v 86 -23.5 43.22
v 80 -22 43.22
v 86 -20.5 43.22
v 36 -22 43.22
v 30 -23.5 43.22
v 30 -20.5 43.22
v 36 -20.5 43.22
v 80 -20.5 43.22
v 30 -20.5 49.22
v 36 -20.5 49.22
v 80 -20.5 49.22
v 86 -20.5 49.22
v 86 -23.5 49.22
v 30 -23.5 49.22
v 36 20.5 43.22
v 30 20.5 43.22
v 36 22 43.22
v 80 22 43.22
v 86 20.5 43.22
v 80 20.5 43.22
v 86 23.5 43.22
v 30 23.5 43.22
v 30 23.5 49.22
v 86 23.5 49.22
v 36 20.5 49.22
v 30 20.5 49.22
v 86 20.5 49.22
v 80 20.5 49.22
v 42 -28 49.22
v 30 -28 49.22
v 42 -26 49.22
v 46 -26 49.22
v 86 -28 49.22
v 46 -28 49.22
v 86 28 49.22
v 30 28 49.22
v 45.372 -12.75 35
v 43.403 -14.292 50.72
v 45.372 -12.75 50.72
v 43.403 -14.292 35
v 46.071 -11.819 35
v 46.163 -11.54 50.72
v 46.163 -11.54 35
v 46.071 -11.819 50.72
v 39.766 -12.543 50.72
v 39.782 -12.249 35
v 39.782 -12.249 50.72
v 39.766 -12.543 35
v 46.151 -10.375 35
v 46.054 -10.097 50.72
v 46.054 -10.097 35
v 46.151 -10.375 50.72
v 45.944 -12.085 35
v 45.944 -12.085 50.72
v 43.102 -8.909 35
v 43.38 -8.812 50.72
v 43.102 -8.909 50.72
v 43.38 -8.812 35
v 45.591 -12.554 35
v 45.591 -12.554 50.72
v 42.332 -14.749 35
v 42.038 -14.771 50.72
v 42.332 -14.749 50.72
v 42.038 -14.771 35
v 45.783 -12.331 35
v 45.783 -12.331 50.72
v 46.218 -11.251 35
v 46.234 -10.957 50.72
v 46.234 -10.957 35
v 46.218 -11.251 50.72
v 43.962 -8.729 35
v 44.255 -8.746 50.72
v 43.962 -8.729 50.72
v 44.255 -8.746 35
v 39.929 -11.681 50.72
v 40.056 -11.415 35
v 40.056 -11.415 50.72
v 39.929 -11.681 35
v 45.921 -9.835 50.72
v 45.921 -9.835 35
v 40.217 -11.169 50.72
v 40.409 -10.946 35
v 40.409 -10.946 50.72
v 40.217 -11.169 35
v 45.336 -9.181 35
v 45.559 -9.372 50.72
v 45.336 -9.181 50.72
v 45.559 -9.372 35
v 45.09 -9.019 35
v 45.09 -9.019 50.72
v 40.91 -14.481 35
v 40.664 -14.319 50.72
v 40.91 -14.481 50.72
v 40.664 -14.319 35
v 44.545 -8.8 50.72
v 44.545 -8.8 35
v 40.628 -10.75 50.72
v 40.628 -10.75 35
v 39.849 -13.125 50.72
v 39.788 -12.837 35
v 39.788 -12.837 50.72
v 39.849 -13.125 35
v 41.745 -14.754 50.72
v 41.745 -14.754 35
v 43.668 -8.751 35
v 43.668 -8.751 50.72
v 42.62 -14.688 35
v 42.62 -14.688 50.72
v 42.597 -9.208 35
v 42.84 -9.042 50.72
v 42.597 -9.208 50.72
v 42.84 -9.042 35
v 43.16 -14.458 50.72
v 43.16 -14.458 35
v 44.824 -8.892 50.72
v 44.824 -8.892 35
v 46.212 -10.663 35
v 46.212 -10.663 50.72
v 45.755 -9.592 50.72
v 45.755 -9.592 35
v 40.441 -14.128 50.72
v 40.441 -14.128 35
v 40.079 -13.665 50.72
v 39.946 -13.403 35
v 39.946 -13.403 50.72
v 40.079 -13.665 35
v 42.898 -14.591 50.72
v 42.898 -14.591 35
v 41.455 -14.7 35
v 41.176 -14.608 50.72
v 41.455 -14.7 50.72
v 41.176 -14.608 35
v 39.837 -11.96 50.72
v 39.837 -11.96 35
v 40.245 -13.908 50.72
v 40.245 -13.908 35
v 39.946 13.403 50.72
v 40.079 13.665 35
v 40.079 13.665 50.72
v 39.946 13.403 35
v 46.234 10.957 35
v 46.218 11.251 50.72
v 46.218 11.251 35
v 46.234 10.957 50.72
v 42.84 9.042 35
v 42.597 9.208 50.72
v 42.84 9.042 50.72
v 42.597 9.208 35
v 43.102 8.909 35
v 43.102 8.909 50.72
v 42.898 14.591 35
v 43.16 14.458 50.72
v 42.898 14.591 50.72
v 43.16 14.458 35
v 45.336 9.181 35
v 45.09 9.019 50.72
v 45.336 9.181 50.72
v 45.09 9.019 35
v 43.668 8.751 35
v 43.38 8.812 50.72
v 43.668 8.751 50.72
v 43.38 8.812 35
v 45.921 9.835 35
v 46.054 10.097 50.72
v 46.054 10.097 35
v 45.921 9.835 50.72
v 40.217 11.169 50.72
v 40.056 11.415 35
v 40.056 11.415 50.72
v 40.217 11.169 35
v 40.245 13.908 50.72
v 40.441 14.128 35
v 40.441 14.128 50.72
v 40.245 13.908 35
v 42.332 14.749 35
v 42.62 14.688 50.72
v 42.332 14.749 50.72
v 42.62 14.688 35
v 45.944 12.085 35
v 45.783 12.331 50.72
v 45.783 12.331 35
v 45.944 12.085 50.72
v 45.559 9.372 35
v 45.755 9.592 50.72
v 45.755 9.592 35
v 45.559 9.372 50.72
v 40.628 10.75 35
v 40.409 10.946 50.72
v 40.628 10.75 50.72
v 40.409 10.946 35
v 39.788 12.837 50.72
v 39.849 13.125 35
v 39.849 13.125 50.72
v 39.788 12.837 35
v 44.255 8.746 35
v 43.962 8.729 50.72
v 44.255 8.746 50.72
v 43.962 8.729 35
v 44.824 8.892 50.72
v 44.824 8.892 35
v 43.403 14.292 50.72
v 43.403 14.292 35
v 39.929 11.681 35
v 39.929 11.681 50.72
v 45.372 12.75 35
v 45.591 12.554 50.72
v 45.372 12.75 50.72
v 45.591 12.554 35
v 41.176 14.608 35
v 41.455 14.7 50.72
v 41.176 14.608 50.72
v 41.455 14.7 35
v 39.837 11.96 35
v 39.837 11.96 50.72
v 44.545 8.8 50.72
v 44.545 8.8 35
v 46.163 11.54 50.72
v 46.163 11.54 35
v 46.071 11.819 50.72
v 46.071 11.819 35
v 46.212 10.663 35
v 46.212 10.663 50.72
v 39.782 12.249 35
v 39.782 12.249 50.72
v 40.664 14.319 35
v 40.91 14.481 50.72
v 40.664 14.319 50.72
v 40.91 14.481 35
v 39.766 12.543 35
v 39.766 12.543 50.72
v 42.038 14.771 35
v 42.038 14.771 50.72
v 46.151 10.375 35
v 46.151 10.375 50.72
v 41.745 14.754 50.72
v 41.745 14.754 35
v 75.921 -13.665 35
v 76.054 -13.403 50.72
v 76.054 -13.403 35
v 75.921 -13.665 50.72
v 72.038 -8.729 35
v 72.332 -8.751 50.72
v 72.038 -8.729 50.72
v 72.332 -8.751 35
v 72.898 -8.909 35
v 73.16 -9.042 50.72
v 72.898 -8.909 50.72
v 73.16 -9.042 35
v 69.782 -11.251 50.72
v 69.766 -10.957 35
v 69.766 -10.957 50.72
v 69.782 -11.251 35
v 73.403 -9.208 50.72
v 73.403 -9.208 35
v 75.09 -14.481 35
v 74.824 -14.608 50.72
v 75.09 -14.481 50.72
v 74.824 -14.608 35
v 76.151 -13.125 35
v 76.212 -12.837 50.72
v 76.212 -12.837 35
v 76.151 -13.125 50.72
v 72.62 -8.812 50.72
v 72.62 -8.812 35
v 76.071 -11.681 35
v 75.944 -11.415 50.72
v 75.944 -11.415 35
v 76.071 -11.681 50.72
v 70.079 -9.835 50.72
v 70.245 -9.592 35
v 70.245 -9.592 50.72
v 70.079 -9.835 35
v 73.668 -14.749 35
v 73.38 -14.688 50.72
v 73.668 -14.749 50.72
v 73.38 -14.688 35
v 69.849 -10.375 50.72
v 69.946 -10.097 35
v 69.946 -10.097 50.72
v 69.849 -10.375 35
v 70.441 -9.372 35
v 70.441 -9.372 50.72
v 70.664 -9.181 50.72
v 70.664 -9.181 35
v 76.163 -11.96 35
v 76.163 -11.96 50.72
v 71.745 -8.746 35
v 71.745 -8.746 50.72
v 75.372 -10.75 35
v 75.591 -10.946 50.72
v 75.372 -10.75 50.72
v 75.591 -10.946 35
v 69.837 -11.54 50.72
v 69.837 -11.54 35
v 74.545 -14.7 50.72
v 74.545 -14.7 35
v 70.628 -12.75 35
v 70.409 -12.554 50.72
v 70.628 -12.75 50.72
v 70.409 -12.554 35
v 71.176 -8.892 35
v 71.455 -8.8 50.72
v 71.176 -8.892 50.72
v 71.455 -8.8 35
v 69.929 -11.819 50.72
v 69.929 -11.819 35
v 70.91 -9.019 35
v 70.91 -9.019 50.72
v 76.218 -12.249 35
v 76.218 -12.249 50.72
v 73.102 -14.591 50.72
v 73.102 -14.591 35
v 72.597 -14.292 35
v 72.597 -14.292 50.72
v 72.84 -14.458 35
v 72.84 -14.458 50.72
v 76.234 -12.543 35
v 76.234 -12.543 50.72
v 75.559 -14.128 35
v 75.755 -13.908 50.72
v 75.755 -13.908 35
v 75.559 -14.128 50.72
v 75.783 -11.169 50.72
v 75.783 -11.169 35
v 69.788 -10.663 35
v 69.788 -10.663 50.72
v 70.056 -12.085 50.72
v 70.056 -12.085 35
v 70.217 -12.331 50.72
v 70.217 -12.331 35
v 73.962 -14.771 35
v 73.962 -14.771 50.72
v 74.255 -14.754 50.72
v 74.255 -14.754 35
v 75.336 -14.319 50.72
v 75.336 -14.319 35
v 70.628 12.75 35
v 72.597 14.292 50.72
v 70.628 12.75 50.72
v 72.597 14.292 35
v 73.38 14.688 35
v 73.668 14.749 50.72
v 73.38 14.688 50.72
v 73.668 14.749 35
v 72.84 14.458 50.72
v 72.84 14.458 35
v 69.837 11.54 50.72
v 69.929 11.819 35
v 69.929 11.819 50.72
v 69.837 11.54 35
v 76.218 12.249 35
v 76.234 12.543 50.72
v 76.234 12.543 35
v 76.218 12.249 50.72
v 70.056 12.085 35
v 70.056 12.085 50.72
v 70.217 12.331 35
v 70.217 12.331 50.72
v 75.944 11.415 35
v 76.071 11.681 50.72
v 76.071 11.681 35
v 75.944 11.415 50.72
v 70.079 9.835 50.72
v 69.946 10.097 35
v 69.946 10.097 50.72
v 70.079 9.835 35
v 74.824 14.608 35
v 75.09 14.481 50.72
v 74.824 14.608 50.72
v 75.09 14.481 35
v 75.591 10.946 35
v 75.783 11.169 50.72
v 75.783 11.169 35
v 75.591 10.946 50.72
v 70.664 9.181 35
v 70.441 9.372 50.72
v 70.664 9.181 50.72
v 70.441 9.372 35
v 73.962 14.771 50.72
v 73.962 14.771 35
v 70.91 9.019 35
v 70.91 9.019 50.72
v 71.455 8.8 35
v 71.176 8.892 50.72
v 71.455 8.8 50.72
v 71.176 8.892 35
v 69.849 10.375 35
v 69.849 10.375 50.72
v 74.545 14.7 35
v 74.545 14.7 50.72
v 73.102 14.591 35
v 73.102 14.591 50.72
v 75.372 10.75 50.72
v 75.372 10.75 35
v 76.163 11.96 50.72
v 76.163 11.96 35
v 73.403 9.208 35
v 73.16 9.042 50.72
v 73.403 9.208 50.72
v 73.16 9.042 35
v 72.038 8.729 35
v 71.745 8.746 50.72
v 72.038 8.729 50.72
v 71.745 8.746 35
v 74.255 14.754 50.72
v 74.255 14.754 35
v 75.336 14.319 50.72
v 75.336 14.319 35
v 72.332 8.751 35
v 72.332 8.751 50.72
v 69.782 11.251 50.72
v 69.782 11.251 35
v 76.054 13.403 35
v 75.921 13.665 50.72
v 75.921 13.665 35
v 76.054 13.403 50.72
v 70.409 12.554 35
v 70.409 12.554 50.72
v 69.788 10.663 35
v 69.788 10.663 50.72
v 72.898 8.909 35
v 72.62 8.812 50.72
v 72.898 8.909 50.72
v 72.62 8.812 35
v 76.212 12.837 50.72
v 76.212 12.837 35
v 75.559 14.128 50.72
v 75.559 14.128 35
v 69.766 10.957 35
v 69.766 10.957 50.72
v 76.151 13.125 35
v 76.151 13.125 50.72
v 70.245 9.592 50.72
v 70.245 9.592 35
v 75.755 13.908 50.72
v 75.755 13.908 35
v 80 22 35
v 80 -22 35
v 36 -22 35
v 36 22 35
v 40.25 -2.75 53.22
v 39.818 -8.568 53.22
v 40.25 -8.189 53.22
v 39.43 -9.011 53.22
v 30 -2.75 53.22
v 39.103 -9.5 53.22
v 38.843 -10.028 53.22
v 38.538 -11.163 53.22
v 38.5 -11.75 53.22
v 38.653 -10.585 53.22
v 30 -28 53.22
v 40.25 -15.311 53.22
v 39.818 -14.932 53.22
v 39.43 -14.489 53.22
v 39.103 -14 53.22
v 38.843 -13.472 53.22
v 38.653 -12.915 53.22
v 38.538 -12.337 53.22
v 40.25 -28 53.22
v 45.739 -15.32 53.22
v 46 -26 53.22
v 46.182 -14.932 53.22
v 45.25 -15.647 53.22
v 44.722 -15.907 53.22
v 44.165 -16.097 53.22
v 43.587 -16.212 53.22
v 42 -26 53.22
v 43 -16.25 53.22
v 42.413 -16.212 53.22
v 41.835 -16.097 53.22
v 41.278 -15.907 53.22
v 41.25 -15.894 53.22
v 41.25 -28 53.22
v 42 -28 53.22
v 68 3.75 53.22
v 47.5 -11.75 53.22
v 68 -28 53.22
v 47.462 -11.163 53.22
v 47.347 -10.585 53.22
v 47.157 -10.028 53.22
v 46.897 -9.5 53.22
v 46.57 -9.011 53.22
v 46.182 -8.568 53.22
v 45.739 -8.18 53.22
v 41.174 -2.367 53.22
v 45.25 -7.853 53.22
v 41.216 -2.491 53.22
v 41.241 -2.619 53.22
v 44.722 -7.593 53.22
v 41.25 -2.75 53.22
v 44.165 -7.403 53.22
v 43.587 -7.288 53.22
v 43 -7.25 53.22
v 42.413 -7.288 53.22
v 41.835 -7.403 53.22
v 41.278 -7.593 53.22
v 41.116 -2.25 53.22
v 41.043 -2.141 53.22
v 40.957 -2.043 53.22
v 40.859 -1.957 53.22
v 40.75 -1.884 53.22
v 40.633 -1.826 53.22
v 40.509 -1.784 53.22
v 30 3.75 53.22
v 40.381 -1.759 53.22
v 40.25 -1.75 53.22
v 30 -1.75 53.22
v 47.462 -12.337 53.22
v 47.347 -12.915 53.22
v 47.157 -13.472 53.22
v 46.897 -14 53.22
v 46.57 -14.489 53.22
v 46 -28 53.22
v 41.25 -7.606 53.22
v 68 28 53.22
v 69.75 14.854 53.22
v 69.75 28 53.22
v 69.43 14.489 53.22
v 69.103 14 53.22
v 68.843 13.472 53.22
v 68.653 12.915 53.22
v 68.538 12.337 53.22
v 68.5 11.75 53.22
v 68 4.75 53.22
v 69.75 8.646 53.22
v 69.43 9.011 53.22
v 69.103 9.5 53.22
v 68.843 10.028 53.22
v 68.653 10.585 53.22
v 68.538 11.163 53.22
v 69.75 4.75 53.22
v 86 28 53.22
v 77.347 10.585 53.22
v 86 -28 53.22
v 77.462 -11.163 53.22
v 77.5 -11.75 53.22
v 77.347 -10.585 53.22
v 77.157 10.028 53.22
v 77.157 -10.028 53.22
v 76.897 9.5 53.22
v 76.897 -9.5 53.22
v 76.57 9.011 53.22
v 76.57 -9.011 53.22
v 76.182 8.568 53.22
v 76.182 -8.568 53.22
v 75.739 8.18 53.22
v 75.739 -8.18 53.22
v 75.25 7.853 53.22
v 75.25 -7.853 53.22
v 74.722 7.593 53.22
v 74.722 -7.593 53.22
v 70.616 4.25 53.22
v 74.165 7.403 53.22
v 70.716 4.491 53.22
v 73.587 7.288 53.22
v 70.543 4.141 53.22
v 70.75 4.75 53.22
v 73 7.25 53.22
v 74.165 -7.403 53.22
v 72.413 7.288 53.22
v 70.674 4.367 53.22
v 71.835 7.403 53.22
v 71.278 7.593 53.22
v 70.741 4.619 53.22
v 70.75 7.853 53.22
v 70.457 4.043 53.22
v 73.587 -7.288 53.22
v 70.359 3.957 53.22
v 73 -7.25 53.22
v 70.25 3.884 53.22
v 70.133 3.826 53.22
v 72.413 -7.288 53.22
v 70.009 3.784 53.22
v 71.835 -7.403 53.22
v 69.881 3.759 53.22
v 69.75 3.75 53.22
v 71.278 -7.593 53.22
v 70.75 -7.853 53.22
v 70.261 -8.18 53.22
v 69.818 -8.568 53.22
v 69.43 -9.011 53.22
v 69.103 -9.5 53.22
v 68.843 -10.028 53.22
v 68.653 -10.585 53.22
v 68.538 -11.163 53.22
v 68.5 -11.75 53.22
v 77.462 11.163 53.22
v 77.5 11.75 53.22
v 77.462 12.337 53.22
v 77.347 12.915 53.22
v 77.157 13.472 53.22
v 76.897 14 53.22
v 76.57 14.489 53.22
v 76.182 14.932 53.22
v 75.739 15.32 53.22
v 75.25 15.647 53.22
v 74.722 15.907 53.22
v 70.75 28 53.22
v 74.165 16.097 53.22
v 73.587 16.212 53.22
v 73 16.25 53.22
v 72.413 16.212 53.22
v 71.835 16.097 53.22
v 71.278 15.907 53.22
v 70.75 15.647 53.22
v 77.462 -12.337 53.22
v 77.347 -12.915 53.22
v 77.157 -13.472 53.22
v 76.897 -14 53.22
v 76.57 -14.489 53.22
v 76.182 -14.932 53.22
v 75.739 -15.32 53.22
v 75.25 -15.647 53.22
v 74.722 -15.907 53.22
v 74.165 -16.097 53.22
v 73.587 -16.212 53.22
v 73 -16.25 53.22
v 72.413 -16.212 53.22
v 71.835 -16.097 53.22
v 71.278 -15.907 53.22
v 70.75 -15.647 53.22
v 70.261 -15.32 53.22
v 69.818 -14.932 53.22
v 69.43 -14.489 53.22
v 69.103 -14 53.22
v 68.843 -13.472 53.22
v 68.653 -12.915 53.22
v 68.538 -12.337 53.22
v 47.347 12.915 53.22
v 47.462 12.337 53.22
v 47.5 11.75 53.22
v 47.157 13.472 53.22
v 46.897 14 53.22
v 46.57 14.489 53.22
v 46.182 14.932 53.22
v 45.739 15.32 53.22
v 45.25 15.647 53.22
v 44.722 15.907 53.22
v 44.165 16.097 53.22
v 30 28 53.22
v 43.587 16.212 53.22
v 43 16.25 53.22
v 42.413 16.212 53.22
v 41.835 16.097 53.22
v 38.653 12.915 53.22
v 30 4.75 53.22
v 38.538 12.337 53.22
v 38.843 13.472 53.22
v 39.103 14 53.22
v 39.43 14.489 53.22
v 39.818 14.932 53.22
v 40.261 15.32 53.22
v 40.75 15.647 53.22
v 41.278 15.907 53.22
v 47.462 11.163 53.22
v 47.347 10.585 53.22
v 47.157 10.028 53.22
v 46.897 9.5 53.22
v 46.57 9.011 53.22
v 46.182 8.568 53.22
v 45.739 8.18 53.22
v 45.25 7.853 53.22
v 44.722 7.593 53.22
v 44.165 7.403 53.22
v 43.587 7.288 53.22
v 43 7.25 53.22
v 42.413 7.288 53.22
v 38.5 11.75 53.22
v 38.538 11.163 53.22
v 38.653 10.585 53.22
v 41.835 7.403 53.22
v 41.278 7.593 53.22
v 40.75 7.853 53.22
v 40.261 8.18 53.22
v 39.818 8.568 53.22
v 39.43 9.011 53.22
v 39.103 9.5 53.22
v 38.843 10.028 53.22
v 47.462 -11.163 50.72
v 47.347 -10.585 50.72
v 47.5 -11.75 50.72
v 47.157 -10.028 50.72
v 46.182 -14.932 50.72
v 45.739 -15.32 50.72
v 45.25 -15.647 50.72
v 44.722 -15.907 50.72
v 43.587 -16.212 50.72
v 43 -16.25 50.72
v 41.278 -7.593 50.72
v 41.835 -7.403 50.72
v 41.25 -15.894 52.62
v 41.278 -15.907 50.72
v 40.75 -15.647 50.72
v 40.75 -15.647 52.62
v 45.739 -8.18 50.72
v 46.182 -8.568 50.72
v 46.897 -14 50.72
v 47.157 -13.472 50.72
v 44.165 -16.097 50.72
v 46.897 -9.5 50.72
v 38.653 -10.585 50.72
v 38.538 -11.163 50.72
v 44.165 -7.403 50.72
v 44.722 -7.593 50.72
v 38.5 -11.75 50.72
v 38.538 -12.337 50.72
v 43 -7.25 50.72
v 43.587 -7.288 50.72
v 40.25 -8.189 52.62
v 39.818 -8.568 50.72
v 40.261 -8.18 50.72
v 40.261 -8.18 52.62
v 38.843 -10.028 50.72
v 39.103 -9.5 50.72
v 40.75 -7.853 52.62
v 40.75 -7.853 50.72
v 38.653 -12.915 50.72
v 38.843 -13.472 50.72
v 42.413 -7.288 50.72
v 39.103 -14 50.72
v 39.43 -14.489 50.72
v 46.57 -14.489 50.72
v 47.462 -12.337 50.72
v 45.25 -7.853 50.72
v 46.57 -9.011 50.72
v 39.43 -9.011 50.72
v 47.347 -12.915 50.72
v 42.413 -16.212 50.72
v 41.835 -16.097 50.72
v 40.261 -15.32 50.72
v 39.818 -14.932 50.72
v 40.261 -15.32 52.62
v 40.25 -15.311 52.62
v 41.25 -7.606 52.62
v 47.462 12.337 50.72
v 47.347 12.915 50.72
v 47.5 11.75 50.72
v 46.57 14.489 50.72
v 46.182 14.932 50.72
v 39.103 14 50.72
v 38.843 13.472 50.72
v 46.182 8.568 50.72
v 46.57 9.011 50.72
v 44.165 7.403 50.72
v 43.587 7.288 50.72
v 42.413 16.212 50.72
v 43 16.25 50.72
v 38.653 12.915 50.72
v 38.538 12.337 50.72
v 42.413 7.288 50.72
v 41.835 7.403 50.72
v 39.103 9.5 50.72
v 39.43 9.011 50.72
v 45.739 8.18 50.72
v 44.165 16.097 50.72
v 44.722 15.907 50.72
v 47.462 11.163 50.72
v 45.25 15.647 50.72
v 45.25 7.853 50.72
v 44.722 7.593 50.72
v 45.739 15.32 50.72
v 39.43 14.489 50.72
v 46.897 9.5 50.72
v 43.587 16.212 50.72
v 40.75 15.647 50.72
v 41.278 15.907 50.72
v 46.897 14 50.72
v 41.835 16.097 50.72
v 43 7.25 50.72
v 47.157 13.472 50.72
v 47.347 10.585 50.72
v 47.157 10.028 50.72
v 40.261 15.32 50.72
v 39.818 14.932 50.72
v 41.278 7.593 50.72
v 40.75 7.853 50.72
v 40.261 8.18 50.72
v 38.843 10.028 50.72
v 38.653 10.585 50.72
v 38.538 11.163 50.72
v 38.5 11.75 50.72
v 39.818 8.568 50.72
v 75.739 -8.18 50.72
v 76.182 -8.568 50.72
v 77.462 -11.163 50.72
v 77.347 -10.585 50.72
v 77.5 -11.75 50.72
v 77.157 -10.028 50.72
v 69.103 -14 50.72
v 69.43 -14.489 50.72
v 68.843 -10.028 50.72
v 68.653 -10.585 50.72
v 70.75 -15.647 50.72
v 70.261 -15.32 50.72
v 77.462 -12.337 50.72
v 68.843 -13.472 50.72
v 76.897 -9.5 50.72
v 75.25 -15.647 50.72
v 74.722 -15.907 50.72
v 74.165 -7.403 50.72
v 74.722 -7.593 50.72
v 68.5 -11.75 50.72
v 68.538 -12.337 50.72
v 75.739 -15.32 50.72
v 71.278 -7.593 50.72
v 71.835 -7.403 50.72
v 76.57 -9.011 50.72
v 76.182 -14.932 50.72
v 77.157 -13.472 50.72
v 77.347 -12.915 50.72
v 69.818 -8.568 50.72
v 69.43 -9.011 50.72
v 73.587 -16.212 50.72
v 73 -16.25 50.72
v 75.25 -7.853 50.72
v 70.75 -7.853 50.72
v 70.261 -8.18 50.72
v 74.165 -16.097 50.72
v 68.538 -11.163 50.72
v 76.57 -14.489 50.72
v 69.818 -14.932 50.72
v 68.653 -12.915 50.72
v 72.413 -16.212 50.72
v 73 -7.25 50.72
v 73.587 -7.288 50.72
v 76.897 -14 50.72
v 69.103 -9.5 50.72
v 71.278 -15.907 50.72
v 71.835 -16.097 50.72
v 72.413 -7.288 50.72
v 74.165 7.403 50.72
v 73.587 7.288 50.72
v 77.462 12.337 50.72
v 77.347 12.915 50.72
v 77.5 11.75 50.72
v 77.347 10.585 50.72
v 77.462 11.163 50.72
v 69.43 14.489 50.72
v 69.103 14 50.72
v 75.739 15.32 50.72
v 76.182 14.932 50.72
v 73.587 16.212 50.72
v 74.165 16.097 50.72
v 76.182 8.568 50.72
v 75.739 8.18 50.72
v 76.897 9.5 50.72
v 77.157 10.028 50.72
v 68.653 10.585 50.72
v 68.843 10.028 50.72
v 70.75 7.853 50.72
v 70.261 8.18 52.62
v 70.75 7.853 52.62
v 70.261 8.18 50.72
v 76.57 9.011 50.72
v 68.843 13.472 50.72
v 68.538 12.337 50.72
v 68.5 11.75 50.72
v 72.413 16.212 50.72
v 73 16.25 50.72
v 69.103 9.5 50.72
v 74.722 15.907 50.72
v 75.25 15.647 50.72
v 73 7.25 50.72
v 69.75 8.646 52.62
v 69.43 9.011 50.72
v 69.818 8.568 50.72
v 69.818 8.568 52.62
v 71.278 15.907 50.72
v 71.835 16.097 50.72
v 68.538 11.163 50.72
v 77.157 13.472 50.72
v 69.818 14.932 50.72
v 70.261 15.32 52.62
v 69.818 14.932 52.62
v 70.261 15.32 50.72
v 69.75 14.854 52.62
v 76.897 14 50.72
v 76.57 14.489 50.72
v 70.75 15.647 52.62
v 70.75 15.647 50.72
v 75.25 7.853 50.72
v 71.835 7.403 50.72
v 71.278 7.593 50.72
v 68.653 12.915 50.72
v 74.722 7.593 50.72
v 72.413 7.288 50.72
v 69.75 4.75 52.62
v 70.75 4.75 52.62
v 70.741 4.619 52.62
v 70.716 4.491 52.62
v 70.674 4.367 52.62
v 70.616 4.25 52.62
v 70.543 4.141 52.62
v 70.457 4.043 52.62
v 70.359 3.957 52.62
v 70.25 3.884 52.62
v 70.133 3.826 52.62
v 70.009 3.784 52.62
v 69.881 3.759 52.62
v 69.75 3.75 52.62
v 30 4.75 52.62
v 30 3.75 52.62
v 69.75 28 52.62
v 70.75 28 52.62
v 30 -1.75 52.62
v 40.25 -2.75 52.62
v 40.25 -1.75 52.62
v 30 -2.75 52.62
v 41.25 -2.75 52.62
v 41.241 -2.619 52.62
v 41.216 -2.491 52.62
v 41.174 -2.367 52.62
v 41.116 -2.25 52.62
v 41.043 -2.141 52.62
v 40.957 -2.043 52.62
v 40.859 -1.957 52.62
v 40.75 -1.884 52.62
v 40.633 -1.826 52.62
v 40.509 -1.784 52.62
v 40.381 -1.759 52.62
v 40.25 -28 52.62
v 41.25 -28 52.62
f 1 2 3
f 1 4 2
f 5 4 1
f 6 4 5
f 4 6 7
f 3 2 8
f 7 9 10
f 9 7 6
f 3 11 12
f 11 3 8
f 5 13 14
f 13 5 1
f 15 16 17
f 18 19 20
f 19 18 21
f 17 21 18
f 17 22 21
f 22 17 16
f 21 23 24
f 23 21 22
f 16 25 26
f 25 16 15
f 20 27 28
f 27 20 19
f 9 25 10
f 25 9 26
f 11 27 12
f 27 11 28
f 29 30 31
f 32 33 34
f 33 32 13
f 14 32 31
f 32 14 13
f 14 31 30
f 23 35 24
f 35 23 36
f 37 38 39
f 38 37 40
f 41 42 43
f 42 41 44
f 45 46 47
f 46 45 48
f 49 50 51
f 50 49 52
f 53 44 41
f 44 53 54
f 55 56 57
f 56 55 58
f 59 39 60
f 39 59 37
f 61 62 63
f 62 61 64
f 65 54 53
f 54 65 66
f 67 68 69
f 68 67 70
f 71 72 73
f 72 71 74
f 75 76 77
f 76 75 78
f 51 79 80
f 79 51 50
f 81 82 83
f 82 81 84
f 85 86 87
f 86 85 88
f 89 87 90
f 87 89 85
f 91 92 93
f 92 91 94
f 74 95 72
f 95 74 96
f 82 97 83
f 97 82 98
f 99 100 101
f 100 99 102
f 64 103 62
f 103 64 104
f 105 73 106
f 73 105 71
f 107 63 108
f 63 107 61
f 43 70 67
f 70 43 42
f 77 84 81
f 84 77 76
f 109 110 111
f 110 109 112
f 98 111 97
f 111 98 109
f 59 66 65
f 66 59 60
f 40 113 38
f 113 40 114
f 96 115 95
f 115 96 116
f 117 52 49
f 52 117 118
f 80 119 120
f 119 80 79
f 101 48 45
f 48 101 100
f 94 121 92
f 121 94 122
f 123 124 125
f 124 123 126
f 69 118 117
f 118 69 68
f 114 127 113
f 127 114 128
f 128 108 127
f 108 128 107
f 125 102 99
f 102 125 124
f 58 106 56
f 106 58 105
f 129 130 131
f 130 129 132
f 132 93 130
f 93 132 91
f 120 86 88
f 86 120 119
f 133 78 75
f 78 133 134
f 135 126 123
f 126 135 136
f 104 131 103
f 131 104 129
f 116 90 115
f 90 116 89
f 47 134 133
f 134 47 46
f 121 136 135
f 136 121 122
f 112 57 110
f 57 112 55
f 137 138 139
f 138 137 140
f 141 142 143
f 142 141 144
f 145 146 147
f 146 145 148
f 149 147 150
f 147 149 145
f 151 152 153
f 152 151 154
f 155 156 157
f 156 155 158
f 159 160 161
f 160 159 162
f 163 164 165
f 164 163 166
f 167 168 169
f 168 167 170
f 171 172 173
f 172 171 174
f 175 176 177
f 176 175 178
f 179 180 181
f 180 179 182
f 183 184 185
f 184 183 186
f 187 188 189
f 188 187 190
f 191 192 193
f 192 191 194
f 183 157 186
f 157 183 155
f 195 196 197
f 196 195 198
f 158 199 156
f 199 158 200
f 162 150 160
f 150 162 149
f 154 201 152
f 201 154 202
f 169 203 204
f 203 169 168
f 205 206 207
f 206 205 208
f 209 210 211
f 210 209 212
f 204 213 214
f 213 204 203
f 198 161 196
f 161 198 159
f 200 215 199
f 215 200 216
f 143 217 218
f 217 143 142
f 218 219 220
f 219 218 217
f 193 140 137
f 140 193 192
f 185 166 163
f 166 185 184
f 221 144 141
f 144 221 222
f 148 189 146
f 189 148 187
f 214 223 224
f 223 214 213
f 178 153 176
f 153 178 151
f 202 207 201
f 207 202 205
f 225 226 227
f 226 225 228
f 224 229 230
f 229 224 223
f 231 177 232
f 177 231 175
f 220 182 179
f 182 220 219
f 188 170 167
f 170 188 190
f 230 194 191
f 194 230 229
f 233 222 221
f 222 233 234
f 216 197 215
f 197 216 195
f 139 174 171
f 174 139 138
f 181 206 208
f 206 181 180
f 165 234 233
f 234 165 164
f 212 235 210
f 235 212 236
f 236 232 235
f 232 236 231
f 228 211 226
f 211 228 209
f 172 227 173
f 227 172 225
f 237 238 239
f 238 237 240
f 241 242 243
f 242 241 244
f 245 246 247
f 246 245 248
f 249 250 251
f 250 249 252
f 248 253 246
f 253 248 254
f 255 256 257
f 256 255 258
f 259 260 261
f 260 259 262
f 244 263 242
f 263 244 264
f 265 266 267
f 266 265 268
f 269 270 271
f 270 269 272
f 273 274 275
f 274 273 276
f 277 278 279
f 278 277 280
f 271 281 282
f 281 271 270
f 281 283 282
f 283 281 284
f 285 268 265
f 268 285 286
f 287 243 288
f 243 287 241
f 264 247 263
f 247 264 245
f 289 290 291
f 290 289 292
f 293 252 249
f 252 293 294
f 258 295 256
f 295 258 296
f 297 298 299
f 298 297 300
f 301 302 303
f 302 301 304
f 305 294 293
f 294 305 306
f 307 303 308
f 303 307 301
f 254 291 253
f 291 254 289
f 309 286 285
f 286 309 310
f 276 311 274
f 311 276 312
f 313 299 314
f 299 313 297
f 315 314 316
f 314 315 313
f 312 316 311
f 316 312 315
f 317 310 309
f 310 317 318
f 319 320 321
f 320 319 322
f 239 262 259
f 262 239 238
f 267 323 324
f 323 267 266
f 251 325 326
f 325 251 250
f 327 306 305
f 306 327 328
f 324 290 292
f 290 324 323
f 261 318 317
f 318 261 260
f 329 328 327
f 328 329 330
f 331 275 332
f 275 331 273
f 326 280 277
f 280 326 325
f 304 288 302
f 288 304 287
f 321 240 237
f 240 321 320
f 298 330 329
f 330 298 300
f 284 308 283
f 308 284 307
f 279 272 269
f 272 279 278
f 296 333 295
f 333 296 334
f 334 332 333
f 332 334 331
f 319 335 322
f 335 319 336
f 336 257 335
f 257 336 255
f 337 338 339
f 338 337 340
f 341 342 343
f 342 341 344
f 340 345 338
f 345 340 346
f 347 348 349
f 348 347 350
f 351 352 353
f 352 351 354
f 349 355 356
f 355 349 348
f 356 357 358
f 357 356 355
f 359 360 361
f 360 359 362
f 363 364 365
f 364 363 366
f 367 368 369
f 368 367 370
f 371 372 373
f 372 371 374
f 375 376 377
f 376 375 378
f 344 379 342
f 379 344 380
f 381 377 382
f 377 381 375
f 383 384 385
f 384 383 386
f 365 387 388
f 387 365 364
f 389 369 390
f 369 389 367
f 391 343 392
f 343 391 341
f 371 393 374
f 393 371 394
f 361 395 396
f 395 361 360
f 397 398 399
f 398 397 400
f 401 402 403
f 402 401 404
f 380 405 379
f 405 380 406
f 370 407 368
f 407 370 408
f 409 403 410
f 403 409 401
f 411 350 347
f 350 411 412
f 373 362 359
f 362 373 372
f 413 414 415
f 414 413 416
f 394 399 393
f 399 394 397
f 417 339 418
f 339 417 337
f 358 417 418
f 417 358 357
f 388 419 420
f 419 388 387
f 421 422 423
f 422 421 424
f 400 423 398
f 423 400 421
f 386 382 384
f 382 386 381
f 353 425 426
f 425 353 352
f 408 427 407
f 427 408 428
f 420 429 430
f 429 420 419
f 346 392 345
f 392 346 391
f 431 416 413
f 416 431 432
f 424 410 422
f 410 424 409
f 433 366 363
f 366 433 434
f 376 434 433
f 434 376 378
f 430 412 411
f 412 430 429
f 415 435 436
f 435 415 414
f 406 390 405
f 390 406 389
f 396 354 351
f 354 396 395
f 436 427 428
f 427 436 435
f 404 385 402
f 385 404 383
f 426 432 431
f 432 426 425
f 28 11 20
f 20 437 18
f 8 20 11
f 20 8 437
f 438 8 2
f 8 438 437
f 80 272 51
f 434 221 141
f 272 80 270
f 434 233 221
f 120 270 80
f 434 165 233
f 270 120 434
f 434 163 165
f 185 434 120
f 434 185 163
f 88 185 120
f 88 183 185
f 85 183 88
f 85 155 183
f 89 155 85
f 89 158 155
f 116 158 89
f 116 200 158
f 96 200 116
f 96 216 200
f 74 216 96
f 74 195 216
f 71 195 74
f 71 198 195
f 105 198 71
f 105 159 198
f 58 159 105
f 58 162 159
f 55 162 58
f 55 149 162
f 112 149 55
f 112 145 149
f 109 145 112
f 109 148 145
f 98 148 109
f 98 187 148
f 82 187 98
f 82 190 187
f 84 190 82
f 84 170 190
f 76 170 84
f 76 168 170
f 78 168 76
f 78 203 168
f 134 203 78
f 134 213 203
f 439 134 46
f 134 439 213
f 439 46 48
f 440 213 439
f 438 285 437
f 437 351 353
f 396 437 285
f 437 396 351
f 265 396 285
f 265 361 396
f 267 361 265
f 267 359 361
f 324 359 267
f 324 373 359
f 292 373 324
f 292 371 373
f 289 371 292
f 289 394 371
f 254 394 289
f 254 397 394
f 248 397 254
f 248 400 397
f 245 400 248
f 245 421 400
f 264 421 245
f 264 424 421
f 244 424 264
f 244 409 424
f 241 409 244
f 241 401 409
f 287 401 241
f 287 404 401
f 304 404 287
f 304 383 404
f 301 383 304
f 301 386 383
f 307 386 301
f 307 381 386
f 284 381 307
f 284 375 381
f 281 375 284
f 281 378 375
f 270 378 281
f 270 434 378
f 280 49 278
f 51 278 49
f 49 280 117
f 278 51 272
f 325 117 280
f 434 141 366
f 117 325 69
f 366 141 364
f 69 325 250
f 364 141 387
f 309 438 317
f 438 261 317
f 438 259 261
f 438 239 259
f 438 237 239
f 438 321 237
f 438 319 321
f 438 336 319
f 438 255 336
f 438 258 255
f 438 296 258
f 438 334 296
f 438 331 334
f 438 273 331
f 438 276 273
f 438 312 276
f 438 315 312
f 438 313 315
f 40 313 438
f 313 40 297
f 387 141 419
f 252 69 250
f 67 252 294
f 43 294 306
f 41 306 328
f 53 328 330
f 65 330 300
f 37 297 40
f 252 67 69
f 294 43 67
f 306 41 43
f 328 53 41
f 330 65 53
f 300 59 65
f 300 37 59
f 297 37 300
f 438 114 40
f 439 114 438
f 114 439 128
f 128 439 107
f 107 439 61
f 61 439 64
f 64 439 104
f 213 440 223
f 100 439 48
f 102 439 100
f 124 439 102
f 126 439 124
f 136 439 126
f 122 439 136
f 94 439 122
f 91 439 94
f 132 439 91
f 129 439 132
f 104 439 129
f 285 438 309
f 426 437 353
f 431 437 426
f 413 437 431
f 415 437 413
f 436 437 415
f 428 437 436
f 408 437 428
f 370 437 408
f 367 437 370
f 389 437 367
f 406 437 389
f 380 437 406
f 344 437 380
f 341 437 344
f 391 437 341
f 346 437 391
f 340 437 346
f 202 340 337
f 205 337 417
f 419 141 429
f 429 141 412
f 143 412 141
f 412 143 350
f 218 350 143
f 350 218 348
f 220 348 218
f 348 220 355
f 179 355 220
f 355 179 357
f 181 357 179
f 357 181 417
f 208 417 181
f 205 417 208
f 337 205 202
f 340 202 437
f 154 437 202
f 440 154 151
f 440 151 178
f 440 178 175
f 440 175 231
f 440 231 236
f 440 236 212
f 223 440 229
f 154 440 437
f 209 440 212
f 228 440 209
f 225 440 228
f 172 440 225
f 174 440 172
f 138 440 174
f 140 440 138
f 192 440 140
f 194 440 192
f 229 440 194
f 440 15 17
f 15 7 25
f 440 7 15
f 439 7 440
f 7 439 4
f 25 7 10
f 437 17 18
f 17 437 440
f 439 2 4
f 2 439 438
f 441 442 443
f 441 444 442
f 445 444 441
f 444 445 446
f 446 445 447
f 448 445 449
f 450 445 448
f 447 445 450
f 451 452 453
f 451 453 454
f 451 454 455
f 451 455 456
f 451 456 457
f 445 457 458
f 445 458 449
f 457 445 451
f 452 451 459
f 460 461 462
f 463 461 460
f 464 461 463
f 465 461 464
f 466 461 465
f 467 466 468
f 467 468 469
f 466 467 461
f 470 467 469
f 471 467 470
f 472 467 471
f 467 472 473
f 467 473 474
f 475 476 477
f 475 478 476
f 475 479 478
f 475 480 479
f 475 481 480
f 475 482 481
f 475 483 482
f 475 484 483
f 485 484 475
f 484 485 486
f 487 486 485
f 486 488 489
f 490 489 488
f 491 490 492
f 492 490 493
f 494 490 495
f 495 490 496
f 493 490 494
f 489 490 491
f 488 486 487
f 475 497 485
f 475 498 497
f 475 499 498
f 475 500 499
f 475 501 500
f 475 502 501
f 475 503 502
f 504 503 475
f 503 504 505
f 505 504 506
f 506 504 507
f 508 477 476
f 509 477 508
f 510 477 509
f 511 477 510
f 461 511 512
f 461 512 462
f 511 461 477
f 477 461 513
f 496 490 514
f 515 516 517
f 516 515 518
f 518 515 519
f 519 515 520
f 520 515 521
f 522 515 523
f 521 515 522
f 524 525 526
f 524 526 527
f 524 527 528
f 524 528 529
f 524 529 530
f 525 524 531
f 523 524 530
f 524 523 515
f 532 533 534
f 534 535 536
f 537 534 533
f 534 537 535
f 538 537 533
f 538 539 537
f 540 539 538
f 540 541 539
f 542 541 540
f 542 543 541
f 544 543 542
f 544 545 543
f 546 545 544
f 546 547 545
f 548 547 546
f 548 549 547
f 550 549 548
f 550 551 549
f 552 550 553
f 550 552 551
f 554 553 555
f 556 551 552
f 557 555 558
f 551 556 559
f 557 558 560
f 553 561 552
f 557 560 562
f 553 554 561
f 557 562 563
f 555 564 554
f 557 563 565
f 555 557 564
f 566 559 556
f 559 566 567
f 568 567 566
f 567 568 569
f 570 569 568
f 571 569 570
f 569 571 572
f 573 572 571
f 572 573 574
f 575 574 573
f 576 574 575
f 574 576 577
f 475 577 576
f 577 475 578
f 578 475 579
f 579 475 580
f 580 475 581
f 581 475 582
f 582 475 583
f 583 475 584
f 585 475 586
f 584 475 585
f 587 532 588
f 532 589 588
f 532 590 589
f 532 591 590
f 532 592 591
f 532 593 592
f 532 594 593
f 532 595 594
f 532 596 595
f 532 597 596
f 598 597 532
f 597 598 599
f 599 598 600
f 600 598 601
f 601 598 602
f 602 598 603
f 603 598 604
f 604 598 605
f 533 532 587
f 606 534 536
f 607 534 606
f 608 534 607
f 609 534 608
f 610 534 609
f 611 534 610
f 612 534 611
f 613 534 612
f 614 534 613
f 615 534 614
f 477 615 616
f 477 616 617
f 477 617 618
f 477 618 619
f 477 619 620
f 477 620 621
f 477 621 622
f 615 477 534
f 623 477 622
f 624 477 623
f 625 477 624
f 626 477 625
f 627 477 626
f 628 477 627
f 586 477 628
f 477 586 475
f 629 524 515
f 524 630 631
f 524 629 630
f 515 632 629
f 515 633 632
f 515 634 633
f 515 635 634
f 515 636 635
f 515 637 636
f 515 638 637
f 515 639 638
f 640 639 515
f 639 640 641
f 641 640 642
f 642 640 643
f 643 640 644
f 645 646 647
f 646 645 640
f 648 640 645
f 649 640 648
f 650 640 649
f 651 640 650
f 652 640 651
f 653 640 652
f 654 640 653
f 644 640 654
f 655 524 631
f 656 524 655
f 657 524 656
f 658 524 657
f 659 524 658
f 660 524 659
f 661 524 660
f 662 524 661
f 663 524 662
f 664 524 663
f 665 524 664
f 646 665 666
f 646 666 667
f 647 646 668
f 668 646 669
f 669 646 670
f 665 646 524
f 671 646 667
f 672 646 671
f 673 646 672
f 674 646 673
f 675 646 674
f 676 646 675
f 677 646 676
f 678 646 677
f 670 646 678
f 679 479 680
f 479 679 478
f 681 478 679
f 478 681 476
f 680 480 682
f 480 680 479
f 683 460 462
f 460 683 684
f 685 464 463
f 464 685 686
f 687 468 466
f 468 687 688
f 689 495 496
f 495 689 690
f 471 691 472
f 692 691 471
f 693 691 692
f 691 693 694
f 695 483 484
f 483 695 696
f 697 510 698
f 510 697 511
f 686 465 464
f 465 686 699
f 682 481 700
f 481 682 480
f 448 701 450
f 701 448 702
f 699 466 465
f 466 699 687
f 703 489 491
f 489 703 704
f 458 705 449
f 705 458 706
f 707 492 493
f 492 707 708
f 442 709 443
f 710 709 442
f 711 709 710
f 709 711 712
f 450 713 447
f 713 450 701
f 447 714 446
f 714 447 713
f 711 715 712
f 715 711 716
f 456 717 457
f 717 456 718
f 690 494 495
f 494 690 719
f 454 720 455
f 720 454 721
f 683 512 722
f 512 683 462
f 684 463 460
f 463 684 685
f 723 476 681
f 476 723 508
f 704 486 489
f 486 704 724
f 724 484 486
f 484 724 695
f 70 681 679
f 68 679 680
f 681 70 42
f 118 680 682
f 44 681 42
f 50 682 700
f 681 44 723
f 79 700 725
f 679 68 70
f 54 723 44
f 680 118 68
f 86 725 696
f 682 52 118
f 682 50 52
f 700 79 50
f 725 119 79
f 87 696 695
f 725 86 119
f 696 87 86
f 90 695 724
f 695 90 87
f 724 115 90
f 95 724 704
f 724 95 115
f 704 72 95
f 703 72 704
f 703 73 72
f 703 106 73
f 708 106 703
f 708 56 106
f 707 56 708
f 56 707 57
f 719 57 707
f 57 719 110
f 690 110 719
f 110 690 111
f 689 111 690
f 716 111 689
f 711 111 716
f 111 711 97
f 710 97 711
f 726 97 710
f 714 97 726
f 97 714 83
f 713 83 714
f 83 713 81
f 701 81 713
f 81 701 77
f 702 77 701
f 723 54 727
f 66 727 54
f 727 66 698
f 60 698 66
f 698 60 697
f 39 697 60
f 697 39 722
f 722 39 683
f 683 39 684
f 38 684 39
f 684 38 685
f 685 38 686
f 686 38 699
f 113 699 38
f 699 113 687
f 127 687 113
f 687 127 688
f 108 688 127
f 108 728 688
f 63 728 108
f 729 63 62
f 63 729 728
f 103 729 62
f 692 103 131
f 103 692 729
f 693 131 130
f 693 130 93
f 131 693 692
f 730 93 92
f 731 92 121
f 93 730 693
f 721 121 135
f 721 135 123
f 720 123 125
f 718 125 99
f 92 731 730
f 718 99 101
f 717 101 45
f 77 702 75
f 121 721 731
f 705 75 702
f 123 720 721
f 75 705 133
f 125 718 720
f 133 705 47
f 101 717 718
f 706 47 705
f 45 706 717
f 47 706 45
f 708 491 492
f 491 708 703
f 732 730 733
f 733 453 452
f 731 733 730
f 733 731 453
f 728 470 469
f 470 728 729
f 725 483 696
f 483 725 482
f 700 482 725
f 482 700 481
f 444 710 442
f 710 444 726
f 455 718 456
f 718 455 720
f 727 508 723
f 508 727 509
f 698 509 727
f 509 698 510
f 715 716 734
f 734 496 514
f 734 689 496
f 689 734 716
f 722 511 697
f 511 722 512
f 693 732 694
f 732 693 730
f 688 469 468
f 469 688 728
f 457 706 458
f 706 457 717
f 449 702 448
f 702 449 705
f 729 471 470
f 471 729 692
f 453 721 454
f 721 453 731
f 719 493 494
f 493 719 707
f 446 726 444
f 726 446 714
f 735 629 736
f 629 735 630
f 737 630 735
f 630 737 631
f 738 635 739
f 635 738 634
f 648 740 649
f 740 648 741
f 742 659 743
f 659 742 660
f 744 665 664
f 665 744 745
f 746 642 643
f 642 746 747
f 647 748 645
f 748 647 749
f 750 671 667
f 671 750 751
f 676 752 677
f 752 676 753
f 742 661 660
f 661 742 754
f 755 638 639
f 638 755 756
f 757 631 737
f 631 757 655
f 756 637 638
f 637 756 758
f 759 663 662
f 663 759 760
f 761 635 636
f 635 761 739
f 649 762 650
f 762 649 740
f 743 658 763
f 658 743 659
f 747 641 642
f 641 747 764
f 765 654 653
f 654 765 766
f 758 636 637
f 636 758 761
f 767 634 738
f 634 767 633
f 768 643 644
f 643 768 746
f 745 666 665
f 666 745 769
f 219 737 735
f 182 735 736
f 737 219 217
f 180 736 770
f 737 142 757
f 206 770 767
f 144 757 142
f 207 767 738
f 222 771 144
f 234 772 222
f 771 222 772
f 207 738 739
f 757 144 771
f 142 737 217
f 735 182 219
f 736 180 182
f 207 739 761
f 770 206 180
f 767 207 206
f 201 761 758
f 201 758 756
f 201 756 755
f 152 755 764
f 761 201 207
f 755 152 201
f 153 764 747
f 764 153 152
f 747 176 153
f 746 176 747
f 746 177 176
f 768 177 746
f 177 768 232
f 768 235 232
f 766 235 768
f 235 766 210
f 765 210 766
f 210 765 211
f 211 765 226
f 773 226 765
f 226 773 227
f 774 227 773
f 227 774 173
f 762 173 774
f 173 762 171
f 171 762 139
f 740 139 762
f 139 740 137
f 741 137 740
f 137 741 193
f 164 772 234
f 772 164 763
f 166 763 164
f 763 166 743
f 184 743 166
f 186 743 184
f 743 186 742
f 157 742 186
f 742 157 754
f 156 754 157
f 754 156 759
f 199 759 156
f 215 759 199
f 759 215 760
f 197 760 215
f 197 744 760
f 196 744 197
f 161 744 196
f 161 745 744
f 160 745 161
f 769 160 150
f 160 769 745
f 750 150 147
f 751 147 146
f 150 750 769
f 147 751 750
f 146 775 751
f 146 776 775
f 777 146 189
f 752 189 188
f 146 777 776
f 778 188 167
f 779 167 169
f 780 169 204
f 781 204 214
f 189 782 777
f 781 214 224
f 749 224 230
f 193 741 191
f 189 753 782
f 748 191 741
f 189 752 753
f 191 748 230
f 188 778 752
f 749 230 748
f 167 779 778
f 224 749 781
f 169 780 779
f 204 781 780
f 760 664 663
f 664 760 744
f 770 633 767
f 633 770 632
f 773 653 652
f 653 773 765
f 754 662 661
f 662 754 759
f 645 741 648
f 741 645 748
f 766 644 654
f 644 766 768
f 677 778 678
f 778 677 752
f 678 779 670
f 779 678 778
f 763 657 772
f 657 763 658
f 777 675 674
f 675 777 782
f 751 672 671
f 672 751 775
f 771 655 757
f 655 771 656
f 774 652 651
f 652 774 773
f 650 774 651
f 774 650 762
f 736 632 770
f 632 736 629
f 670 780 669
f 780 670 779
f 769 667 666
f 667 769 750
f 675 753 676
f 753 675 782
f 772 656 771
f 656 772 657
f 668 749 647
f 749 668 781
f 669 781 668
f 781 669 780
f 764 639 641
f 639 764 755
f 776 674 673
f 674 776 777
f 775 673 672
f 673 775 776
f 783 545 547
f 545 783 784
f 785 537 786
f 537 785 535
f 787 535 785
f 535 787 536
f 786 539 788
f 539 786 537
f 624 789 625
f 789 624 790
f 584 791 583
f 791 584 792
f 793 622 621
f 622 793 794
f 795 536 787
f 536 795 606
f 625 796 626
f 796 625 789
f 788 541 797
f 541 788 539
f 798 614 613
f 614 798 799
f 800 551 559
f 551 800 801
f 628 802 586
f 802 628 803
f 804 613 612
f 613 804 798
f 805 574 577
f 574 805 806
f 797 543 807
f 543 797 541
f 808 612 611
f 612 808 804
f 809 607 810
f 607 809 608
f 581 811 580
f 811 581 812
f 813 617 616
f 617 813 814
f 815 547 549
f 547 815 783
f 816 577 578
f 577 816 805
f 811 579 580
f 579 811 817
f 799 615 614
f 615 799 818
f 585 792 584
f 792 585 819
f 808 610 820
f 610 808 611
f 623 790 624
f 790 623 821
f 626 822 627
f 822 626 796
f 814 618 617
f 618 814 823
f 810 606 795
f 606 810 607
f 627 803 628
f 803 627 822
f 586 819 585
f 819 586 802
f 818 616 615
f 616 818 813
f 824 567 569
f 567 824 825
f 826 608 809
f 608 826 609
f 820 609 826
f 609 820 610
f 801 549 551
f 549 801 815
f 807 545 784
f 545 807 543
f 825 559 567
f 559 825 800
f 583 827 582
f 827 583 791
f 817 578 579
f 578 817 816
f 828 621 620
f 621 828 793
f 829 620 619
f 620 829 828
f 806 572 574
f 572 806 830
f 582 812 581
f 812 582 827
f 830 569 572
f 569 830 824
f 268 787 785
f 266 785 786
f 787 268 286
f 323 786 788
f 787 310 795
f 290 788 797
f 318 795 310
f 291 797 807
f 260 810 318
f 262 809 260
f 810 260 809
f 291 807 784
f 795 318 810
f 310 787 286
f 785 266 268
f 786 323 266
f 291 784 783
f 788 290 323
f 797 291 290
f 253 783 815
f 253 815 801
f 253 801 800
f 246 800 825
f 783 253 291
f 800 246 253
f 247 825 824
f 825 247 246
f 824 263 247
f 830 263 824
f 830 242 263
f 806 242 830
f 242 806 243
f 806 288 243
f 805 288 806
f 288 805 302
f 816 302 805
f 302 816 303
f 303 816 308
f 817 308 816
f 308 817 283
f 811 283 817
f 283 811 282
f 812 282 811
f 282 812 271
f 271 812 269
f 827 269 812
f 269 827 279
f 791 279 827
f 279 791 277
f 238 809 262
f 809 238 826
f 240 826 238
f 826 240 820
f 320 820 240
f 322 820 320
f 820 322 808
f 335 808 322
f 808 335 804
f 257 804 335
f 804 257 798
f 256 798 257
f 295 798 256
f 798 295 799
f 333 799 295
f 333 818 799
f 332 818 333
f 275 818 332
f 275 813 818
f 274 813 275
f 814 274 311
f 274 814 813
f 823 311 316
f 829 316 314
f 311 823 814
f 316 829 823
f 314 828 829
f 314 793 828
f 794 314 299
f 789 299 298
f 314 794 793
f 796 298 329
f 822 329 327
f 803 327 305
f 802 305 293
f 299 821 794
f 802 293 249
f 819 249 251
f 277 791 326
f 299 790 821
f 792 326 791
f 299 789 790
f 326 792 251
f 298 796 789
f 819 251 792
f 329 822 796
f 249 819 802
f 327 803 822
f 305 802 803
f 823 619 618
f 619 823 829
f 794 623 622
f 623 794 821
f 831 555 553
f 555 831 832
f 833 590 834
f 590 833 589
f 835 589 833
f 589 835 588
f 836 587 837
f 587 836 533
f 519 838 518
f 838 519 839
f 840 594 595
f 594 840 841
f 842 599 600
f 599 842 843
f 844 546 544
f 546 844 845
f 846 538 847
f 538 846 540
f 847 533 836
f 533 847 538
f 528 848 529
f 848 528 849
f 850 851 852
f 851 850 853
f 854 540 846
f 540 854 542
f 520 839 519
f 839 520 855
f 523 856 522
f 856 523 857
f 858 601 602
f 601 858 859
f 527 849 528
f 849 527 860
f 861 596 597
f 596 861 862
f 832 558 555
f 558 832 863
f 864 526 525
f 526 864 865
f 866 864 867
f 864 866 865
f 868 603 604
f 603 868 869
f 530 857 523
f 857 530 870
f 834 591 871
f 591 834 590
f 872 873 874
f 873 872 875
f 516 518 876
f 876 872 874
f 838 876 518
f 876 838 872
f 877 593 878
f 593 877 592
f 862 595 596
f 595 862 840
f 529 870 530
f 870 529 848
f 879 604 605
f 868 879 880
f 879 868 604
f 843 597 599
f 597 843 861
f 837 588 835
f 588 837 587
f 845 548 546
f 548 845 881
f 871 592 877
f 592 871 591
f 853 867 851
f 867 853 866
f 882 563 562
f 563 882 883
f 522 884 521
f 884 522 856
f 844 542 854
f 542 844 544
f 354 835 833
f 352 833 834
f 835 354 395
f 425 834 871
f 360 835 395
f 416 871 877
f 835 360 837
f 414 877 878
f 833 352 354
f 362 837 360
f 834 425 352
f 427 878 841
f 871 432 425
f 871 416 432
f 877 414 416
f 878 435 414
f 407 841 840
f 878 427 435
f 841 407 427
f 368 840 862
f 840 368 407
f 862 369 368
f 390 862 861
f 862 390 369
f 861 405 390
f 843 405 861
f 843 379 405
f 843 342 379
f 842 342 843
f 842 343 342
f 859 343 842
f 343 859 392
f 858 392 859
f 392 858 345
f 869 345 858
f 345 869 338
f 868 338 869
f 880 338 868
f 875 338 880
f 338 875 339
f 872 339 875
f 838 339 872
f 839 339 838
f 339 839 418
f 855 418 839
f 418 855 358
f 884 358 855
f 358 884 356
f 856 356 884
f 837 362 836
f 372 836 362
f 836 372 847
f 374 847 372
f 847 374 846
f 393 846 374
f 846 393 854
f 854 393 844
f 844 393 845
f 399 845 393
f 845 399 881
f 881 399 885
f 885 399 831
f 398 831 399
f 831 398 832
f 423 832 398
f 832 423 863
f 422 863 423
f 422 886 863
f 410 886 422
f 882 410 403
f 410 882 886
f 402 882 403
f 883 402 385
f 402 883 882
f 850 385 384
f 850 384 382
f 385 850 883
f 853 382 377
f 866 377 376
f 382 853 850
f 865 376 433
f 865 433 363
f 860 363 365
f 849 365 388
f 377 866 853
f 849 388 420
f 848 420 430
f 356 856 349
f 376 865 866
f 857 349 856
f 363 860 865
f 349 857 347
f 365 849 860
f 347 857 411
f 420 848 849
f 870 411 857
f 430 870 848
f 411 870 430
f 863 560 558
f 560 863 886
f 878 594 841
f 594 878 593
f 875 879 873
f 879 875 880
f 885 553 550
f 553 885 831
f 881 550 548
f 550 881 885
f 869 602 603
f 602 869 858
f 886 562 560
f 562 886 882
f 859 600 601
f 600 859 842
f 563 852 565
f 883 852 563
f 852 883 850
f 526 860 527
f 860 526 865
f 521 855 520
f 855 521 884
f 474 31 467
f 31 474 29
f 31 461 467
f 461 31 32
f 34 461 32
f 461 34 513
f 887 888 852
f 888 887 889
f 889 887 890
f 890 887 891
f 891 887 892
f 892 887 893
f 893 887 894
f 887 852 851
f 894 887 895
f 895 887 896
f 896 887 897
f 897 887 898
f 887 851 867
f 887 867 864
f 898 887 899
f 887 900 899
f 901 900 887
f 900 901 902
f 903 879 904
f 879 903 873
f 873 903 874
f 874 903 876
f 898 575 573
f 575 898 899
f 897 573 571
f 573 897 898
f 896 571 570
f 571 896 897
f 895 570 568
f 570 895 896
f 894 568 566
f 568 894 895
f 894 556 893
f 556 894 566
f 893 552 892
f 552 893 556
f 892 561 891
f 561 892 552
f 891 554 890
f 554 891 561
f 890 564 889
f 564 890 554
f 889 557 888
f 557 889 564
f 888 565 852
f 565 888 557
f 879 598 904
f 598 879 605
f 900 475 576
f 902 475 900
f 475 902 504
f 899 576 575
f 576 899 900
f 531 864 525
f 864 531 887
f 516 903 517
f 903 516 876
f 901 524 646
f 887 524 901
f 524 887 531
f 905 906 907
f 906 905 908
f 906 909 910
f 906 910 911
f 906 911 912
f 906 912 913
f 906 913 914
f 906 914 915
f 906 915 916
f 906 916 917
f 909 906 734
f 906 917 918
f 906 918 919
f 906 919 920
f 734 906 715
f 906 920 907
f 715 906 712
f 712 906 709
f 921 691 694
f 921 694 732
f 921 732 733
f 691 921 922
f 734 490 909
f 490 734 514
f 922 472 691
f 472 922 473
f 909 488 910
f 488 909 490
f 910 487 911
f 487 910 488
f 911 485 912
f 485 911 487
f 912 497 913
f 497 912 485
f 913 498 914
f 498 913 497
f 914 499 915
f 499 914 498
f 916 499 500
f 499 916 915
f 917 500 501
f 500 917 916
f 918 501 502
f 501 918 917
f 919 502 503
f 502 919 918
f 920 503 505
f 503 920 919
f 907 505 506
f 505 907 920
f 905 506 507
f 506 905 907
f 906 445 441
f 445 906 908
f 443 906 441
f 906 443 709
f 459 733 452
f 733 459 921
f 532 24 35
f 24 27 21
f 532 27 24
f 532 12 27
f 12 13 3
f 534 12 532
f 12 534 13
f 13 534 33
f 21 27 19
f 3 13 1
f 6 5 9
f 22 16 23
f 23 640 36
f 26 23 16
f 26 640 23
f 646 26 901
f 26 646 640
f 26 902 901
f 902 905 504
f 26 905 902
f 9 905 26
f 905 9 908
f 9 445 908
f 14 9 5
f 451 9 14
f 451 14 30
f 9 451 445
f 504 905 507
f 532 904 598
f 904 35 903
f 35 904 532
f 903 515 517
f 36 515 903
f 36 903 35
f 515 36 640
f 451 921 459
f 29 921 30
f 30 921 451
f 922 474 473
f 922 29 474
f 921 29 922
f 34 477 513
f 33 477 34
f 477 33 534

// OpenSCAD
// Quick print to validate the caster mount: spacer block with its four slots and the
// counterbores in the plate above, on a patch of plate. Bolt the caster on, check it sits square.
include <chassis.scad>
coupon_only = true;
show_ghosts = false;
module coupon() {
    difference() {
        intersection() {
            chassis();
            translate([caster_x - (caster_plate + 4) / 2 - 6, -(caster_plate + 4) / 2 - 6, 0])
                cube([caster_plate + 4 + 12, caster_plate + 4 + 12, 100]);
        }
        // the sonar cradle starts above the plate just ahead of the block: shave everything above
        // the plate surface in that zone so the coupon is only the caster mount
        translate([caster_x + 10, -100, plate_z + plate_t]) cube([100, 200, 100]);
    }
}
coupon();
